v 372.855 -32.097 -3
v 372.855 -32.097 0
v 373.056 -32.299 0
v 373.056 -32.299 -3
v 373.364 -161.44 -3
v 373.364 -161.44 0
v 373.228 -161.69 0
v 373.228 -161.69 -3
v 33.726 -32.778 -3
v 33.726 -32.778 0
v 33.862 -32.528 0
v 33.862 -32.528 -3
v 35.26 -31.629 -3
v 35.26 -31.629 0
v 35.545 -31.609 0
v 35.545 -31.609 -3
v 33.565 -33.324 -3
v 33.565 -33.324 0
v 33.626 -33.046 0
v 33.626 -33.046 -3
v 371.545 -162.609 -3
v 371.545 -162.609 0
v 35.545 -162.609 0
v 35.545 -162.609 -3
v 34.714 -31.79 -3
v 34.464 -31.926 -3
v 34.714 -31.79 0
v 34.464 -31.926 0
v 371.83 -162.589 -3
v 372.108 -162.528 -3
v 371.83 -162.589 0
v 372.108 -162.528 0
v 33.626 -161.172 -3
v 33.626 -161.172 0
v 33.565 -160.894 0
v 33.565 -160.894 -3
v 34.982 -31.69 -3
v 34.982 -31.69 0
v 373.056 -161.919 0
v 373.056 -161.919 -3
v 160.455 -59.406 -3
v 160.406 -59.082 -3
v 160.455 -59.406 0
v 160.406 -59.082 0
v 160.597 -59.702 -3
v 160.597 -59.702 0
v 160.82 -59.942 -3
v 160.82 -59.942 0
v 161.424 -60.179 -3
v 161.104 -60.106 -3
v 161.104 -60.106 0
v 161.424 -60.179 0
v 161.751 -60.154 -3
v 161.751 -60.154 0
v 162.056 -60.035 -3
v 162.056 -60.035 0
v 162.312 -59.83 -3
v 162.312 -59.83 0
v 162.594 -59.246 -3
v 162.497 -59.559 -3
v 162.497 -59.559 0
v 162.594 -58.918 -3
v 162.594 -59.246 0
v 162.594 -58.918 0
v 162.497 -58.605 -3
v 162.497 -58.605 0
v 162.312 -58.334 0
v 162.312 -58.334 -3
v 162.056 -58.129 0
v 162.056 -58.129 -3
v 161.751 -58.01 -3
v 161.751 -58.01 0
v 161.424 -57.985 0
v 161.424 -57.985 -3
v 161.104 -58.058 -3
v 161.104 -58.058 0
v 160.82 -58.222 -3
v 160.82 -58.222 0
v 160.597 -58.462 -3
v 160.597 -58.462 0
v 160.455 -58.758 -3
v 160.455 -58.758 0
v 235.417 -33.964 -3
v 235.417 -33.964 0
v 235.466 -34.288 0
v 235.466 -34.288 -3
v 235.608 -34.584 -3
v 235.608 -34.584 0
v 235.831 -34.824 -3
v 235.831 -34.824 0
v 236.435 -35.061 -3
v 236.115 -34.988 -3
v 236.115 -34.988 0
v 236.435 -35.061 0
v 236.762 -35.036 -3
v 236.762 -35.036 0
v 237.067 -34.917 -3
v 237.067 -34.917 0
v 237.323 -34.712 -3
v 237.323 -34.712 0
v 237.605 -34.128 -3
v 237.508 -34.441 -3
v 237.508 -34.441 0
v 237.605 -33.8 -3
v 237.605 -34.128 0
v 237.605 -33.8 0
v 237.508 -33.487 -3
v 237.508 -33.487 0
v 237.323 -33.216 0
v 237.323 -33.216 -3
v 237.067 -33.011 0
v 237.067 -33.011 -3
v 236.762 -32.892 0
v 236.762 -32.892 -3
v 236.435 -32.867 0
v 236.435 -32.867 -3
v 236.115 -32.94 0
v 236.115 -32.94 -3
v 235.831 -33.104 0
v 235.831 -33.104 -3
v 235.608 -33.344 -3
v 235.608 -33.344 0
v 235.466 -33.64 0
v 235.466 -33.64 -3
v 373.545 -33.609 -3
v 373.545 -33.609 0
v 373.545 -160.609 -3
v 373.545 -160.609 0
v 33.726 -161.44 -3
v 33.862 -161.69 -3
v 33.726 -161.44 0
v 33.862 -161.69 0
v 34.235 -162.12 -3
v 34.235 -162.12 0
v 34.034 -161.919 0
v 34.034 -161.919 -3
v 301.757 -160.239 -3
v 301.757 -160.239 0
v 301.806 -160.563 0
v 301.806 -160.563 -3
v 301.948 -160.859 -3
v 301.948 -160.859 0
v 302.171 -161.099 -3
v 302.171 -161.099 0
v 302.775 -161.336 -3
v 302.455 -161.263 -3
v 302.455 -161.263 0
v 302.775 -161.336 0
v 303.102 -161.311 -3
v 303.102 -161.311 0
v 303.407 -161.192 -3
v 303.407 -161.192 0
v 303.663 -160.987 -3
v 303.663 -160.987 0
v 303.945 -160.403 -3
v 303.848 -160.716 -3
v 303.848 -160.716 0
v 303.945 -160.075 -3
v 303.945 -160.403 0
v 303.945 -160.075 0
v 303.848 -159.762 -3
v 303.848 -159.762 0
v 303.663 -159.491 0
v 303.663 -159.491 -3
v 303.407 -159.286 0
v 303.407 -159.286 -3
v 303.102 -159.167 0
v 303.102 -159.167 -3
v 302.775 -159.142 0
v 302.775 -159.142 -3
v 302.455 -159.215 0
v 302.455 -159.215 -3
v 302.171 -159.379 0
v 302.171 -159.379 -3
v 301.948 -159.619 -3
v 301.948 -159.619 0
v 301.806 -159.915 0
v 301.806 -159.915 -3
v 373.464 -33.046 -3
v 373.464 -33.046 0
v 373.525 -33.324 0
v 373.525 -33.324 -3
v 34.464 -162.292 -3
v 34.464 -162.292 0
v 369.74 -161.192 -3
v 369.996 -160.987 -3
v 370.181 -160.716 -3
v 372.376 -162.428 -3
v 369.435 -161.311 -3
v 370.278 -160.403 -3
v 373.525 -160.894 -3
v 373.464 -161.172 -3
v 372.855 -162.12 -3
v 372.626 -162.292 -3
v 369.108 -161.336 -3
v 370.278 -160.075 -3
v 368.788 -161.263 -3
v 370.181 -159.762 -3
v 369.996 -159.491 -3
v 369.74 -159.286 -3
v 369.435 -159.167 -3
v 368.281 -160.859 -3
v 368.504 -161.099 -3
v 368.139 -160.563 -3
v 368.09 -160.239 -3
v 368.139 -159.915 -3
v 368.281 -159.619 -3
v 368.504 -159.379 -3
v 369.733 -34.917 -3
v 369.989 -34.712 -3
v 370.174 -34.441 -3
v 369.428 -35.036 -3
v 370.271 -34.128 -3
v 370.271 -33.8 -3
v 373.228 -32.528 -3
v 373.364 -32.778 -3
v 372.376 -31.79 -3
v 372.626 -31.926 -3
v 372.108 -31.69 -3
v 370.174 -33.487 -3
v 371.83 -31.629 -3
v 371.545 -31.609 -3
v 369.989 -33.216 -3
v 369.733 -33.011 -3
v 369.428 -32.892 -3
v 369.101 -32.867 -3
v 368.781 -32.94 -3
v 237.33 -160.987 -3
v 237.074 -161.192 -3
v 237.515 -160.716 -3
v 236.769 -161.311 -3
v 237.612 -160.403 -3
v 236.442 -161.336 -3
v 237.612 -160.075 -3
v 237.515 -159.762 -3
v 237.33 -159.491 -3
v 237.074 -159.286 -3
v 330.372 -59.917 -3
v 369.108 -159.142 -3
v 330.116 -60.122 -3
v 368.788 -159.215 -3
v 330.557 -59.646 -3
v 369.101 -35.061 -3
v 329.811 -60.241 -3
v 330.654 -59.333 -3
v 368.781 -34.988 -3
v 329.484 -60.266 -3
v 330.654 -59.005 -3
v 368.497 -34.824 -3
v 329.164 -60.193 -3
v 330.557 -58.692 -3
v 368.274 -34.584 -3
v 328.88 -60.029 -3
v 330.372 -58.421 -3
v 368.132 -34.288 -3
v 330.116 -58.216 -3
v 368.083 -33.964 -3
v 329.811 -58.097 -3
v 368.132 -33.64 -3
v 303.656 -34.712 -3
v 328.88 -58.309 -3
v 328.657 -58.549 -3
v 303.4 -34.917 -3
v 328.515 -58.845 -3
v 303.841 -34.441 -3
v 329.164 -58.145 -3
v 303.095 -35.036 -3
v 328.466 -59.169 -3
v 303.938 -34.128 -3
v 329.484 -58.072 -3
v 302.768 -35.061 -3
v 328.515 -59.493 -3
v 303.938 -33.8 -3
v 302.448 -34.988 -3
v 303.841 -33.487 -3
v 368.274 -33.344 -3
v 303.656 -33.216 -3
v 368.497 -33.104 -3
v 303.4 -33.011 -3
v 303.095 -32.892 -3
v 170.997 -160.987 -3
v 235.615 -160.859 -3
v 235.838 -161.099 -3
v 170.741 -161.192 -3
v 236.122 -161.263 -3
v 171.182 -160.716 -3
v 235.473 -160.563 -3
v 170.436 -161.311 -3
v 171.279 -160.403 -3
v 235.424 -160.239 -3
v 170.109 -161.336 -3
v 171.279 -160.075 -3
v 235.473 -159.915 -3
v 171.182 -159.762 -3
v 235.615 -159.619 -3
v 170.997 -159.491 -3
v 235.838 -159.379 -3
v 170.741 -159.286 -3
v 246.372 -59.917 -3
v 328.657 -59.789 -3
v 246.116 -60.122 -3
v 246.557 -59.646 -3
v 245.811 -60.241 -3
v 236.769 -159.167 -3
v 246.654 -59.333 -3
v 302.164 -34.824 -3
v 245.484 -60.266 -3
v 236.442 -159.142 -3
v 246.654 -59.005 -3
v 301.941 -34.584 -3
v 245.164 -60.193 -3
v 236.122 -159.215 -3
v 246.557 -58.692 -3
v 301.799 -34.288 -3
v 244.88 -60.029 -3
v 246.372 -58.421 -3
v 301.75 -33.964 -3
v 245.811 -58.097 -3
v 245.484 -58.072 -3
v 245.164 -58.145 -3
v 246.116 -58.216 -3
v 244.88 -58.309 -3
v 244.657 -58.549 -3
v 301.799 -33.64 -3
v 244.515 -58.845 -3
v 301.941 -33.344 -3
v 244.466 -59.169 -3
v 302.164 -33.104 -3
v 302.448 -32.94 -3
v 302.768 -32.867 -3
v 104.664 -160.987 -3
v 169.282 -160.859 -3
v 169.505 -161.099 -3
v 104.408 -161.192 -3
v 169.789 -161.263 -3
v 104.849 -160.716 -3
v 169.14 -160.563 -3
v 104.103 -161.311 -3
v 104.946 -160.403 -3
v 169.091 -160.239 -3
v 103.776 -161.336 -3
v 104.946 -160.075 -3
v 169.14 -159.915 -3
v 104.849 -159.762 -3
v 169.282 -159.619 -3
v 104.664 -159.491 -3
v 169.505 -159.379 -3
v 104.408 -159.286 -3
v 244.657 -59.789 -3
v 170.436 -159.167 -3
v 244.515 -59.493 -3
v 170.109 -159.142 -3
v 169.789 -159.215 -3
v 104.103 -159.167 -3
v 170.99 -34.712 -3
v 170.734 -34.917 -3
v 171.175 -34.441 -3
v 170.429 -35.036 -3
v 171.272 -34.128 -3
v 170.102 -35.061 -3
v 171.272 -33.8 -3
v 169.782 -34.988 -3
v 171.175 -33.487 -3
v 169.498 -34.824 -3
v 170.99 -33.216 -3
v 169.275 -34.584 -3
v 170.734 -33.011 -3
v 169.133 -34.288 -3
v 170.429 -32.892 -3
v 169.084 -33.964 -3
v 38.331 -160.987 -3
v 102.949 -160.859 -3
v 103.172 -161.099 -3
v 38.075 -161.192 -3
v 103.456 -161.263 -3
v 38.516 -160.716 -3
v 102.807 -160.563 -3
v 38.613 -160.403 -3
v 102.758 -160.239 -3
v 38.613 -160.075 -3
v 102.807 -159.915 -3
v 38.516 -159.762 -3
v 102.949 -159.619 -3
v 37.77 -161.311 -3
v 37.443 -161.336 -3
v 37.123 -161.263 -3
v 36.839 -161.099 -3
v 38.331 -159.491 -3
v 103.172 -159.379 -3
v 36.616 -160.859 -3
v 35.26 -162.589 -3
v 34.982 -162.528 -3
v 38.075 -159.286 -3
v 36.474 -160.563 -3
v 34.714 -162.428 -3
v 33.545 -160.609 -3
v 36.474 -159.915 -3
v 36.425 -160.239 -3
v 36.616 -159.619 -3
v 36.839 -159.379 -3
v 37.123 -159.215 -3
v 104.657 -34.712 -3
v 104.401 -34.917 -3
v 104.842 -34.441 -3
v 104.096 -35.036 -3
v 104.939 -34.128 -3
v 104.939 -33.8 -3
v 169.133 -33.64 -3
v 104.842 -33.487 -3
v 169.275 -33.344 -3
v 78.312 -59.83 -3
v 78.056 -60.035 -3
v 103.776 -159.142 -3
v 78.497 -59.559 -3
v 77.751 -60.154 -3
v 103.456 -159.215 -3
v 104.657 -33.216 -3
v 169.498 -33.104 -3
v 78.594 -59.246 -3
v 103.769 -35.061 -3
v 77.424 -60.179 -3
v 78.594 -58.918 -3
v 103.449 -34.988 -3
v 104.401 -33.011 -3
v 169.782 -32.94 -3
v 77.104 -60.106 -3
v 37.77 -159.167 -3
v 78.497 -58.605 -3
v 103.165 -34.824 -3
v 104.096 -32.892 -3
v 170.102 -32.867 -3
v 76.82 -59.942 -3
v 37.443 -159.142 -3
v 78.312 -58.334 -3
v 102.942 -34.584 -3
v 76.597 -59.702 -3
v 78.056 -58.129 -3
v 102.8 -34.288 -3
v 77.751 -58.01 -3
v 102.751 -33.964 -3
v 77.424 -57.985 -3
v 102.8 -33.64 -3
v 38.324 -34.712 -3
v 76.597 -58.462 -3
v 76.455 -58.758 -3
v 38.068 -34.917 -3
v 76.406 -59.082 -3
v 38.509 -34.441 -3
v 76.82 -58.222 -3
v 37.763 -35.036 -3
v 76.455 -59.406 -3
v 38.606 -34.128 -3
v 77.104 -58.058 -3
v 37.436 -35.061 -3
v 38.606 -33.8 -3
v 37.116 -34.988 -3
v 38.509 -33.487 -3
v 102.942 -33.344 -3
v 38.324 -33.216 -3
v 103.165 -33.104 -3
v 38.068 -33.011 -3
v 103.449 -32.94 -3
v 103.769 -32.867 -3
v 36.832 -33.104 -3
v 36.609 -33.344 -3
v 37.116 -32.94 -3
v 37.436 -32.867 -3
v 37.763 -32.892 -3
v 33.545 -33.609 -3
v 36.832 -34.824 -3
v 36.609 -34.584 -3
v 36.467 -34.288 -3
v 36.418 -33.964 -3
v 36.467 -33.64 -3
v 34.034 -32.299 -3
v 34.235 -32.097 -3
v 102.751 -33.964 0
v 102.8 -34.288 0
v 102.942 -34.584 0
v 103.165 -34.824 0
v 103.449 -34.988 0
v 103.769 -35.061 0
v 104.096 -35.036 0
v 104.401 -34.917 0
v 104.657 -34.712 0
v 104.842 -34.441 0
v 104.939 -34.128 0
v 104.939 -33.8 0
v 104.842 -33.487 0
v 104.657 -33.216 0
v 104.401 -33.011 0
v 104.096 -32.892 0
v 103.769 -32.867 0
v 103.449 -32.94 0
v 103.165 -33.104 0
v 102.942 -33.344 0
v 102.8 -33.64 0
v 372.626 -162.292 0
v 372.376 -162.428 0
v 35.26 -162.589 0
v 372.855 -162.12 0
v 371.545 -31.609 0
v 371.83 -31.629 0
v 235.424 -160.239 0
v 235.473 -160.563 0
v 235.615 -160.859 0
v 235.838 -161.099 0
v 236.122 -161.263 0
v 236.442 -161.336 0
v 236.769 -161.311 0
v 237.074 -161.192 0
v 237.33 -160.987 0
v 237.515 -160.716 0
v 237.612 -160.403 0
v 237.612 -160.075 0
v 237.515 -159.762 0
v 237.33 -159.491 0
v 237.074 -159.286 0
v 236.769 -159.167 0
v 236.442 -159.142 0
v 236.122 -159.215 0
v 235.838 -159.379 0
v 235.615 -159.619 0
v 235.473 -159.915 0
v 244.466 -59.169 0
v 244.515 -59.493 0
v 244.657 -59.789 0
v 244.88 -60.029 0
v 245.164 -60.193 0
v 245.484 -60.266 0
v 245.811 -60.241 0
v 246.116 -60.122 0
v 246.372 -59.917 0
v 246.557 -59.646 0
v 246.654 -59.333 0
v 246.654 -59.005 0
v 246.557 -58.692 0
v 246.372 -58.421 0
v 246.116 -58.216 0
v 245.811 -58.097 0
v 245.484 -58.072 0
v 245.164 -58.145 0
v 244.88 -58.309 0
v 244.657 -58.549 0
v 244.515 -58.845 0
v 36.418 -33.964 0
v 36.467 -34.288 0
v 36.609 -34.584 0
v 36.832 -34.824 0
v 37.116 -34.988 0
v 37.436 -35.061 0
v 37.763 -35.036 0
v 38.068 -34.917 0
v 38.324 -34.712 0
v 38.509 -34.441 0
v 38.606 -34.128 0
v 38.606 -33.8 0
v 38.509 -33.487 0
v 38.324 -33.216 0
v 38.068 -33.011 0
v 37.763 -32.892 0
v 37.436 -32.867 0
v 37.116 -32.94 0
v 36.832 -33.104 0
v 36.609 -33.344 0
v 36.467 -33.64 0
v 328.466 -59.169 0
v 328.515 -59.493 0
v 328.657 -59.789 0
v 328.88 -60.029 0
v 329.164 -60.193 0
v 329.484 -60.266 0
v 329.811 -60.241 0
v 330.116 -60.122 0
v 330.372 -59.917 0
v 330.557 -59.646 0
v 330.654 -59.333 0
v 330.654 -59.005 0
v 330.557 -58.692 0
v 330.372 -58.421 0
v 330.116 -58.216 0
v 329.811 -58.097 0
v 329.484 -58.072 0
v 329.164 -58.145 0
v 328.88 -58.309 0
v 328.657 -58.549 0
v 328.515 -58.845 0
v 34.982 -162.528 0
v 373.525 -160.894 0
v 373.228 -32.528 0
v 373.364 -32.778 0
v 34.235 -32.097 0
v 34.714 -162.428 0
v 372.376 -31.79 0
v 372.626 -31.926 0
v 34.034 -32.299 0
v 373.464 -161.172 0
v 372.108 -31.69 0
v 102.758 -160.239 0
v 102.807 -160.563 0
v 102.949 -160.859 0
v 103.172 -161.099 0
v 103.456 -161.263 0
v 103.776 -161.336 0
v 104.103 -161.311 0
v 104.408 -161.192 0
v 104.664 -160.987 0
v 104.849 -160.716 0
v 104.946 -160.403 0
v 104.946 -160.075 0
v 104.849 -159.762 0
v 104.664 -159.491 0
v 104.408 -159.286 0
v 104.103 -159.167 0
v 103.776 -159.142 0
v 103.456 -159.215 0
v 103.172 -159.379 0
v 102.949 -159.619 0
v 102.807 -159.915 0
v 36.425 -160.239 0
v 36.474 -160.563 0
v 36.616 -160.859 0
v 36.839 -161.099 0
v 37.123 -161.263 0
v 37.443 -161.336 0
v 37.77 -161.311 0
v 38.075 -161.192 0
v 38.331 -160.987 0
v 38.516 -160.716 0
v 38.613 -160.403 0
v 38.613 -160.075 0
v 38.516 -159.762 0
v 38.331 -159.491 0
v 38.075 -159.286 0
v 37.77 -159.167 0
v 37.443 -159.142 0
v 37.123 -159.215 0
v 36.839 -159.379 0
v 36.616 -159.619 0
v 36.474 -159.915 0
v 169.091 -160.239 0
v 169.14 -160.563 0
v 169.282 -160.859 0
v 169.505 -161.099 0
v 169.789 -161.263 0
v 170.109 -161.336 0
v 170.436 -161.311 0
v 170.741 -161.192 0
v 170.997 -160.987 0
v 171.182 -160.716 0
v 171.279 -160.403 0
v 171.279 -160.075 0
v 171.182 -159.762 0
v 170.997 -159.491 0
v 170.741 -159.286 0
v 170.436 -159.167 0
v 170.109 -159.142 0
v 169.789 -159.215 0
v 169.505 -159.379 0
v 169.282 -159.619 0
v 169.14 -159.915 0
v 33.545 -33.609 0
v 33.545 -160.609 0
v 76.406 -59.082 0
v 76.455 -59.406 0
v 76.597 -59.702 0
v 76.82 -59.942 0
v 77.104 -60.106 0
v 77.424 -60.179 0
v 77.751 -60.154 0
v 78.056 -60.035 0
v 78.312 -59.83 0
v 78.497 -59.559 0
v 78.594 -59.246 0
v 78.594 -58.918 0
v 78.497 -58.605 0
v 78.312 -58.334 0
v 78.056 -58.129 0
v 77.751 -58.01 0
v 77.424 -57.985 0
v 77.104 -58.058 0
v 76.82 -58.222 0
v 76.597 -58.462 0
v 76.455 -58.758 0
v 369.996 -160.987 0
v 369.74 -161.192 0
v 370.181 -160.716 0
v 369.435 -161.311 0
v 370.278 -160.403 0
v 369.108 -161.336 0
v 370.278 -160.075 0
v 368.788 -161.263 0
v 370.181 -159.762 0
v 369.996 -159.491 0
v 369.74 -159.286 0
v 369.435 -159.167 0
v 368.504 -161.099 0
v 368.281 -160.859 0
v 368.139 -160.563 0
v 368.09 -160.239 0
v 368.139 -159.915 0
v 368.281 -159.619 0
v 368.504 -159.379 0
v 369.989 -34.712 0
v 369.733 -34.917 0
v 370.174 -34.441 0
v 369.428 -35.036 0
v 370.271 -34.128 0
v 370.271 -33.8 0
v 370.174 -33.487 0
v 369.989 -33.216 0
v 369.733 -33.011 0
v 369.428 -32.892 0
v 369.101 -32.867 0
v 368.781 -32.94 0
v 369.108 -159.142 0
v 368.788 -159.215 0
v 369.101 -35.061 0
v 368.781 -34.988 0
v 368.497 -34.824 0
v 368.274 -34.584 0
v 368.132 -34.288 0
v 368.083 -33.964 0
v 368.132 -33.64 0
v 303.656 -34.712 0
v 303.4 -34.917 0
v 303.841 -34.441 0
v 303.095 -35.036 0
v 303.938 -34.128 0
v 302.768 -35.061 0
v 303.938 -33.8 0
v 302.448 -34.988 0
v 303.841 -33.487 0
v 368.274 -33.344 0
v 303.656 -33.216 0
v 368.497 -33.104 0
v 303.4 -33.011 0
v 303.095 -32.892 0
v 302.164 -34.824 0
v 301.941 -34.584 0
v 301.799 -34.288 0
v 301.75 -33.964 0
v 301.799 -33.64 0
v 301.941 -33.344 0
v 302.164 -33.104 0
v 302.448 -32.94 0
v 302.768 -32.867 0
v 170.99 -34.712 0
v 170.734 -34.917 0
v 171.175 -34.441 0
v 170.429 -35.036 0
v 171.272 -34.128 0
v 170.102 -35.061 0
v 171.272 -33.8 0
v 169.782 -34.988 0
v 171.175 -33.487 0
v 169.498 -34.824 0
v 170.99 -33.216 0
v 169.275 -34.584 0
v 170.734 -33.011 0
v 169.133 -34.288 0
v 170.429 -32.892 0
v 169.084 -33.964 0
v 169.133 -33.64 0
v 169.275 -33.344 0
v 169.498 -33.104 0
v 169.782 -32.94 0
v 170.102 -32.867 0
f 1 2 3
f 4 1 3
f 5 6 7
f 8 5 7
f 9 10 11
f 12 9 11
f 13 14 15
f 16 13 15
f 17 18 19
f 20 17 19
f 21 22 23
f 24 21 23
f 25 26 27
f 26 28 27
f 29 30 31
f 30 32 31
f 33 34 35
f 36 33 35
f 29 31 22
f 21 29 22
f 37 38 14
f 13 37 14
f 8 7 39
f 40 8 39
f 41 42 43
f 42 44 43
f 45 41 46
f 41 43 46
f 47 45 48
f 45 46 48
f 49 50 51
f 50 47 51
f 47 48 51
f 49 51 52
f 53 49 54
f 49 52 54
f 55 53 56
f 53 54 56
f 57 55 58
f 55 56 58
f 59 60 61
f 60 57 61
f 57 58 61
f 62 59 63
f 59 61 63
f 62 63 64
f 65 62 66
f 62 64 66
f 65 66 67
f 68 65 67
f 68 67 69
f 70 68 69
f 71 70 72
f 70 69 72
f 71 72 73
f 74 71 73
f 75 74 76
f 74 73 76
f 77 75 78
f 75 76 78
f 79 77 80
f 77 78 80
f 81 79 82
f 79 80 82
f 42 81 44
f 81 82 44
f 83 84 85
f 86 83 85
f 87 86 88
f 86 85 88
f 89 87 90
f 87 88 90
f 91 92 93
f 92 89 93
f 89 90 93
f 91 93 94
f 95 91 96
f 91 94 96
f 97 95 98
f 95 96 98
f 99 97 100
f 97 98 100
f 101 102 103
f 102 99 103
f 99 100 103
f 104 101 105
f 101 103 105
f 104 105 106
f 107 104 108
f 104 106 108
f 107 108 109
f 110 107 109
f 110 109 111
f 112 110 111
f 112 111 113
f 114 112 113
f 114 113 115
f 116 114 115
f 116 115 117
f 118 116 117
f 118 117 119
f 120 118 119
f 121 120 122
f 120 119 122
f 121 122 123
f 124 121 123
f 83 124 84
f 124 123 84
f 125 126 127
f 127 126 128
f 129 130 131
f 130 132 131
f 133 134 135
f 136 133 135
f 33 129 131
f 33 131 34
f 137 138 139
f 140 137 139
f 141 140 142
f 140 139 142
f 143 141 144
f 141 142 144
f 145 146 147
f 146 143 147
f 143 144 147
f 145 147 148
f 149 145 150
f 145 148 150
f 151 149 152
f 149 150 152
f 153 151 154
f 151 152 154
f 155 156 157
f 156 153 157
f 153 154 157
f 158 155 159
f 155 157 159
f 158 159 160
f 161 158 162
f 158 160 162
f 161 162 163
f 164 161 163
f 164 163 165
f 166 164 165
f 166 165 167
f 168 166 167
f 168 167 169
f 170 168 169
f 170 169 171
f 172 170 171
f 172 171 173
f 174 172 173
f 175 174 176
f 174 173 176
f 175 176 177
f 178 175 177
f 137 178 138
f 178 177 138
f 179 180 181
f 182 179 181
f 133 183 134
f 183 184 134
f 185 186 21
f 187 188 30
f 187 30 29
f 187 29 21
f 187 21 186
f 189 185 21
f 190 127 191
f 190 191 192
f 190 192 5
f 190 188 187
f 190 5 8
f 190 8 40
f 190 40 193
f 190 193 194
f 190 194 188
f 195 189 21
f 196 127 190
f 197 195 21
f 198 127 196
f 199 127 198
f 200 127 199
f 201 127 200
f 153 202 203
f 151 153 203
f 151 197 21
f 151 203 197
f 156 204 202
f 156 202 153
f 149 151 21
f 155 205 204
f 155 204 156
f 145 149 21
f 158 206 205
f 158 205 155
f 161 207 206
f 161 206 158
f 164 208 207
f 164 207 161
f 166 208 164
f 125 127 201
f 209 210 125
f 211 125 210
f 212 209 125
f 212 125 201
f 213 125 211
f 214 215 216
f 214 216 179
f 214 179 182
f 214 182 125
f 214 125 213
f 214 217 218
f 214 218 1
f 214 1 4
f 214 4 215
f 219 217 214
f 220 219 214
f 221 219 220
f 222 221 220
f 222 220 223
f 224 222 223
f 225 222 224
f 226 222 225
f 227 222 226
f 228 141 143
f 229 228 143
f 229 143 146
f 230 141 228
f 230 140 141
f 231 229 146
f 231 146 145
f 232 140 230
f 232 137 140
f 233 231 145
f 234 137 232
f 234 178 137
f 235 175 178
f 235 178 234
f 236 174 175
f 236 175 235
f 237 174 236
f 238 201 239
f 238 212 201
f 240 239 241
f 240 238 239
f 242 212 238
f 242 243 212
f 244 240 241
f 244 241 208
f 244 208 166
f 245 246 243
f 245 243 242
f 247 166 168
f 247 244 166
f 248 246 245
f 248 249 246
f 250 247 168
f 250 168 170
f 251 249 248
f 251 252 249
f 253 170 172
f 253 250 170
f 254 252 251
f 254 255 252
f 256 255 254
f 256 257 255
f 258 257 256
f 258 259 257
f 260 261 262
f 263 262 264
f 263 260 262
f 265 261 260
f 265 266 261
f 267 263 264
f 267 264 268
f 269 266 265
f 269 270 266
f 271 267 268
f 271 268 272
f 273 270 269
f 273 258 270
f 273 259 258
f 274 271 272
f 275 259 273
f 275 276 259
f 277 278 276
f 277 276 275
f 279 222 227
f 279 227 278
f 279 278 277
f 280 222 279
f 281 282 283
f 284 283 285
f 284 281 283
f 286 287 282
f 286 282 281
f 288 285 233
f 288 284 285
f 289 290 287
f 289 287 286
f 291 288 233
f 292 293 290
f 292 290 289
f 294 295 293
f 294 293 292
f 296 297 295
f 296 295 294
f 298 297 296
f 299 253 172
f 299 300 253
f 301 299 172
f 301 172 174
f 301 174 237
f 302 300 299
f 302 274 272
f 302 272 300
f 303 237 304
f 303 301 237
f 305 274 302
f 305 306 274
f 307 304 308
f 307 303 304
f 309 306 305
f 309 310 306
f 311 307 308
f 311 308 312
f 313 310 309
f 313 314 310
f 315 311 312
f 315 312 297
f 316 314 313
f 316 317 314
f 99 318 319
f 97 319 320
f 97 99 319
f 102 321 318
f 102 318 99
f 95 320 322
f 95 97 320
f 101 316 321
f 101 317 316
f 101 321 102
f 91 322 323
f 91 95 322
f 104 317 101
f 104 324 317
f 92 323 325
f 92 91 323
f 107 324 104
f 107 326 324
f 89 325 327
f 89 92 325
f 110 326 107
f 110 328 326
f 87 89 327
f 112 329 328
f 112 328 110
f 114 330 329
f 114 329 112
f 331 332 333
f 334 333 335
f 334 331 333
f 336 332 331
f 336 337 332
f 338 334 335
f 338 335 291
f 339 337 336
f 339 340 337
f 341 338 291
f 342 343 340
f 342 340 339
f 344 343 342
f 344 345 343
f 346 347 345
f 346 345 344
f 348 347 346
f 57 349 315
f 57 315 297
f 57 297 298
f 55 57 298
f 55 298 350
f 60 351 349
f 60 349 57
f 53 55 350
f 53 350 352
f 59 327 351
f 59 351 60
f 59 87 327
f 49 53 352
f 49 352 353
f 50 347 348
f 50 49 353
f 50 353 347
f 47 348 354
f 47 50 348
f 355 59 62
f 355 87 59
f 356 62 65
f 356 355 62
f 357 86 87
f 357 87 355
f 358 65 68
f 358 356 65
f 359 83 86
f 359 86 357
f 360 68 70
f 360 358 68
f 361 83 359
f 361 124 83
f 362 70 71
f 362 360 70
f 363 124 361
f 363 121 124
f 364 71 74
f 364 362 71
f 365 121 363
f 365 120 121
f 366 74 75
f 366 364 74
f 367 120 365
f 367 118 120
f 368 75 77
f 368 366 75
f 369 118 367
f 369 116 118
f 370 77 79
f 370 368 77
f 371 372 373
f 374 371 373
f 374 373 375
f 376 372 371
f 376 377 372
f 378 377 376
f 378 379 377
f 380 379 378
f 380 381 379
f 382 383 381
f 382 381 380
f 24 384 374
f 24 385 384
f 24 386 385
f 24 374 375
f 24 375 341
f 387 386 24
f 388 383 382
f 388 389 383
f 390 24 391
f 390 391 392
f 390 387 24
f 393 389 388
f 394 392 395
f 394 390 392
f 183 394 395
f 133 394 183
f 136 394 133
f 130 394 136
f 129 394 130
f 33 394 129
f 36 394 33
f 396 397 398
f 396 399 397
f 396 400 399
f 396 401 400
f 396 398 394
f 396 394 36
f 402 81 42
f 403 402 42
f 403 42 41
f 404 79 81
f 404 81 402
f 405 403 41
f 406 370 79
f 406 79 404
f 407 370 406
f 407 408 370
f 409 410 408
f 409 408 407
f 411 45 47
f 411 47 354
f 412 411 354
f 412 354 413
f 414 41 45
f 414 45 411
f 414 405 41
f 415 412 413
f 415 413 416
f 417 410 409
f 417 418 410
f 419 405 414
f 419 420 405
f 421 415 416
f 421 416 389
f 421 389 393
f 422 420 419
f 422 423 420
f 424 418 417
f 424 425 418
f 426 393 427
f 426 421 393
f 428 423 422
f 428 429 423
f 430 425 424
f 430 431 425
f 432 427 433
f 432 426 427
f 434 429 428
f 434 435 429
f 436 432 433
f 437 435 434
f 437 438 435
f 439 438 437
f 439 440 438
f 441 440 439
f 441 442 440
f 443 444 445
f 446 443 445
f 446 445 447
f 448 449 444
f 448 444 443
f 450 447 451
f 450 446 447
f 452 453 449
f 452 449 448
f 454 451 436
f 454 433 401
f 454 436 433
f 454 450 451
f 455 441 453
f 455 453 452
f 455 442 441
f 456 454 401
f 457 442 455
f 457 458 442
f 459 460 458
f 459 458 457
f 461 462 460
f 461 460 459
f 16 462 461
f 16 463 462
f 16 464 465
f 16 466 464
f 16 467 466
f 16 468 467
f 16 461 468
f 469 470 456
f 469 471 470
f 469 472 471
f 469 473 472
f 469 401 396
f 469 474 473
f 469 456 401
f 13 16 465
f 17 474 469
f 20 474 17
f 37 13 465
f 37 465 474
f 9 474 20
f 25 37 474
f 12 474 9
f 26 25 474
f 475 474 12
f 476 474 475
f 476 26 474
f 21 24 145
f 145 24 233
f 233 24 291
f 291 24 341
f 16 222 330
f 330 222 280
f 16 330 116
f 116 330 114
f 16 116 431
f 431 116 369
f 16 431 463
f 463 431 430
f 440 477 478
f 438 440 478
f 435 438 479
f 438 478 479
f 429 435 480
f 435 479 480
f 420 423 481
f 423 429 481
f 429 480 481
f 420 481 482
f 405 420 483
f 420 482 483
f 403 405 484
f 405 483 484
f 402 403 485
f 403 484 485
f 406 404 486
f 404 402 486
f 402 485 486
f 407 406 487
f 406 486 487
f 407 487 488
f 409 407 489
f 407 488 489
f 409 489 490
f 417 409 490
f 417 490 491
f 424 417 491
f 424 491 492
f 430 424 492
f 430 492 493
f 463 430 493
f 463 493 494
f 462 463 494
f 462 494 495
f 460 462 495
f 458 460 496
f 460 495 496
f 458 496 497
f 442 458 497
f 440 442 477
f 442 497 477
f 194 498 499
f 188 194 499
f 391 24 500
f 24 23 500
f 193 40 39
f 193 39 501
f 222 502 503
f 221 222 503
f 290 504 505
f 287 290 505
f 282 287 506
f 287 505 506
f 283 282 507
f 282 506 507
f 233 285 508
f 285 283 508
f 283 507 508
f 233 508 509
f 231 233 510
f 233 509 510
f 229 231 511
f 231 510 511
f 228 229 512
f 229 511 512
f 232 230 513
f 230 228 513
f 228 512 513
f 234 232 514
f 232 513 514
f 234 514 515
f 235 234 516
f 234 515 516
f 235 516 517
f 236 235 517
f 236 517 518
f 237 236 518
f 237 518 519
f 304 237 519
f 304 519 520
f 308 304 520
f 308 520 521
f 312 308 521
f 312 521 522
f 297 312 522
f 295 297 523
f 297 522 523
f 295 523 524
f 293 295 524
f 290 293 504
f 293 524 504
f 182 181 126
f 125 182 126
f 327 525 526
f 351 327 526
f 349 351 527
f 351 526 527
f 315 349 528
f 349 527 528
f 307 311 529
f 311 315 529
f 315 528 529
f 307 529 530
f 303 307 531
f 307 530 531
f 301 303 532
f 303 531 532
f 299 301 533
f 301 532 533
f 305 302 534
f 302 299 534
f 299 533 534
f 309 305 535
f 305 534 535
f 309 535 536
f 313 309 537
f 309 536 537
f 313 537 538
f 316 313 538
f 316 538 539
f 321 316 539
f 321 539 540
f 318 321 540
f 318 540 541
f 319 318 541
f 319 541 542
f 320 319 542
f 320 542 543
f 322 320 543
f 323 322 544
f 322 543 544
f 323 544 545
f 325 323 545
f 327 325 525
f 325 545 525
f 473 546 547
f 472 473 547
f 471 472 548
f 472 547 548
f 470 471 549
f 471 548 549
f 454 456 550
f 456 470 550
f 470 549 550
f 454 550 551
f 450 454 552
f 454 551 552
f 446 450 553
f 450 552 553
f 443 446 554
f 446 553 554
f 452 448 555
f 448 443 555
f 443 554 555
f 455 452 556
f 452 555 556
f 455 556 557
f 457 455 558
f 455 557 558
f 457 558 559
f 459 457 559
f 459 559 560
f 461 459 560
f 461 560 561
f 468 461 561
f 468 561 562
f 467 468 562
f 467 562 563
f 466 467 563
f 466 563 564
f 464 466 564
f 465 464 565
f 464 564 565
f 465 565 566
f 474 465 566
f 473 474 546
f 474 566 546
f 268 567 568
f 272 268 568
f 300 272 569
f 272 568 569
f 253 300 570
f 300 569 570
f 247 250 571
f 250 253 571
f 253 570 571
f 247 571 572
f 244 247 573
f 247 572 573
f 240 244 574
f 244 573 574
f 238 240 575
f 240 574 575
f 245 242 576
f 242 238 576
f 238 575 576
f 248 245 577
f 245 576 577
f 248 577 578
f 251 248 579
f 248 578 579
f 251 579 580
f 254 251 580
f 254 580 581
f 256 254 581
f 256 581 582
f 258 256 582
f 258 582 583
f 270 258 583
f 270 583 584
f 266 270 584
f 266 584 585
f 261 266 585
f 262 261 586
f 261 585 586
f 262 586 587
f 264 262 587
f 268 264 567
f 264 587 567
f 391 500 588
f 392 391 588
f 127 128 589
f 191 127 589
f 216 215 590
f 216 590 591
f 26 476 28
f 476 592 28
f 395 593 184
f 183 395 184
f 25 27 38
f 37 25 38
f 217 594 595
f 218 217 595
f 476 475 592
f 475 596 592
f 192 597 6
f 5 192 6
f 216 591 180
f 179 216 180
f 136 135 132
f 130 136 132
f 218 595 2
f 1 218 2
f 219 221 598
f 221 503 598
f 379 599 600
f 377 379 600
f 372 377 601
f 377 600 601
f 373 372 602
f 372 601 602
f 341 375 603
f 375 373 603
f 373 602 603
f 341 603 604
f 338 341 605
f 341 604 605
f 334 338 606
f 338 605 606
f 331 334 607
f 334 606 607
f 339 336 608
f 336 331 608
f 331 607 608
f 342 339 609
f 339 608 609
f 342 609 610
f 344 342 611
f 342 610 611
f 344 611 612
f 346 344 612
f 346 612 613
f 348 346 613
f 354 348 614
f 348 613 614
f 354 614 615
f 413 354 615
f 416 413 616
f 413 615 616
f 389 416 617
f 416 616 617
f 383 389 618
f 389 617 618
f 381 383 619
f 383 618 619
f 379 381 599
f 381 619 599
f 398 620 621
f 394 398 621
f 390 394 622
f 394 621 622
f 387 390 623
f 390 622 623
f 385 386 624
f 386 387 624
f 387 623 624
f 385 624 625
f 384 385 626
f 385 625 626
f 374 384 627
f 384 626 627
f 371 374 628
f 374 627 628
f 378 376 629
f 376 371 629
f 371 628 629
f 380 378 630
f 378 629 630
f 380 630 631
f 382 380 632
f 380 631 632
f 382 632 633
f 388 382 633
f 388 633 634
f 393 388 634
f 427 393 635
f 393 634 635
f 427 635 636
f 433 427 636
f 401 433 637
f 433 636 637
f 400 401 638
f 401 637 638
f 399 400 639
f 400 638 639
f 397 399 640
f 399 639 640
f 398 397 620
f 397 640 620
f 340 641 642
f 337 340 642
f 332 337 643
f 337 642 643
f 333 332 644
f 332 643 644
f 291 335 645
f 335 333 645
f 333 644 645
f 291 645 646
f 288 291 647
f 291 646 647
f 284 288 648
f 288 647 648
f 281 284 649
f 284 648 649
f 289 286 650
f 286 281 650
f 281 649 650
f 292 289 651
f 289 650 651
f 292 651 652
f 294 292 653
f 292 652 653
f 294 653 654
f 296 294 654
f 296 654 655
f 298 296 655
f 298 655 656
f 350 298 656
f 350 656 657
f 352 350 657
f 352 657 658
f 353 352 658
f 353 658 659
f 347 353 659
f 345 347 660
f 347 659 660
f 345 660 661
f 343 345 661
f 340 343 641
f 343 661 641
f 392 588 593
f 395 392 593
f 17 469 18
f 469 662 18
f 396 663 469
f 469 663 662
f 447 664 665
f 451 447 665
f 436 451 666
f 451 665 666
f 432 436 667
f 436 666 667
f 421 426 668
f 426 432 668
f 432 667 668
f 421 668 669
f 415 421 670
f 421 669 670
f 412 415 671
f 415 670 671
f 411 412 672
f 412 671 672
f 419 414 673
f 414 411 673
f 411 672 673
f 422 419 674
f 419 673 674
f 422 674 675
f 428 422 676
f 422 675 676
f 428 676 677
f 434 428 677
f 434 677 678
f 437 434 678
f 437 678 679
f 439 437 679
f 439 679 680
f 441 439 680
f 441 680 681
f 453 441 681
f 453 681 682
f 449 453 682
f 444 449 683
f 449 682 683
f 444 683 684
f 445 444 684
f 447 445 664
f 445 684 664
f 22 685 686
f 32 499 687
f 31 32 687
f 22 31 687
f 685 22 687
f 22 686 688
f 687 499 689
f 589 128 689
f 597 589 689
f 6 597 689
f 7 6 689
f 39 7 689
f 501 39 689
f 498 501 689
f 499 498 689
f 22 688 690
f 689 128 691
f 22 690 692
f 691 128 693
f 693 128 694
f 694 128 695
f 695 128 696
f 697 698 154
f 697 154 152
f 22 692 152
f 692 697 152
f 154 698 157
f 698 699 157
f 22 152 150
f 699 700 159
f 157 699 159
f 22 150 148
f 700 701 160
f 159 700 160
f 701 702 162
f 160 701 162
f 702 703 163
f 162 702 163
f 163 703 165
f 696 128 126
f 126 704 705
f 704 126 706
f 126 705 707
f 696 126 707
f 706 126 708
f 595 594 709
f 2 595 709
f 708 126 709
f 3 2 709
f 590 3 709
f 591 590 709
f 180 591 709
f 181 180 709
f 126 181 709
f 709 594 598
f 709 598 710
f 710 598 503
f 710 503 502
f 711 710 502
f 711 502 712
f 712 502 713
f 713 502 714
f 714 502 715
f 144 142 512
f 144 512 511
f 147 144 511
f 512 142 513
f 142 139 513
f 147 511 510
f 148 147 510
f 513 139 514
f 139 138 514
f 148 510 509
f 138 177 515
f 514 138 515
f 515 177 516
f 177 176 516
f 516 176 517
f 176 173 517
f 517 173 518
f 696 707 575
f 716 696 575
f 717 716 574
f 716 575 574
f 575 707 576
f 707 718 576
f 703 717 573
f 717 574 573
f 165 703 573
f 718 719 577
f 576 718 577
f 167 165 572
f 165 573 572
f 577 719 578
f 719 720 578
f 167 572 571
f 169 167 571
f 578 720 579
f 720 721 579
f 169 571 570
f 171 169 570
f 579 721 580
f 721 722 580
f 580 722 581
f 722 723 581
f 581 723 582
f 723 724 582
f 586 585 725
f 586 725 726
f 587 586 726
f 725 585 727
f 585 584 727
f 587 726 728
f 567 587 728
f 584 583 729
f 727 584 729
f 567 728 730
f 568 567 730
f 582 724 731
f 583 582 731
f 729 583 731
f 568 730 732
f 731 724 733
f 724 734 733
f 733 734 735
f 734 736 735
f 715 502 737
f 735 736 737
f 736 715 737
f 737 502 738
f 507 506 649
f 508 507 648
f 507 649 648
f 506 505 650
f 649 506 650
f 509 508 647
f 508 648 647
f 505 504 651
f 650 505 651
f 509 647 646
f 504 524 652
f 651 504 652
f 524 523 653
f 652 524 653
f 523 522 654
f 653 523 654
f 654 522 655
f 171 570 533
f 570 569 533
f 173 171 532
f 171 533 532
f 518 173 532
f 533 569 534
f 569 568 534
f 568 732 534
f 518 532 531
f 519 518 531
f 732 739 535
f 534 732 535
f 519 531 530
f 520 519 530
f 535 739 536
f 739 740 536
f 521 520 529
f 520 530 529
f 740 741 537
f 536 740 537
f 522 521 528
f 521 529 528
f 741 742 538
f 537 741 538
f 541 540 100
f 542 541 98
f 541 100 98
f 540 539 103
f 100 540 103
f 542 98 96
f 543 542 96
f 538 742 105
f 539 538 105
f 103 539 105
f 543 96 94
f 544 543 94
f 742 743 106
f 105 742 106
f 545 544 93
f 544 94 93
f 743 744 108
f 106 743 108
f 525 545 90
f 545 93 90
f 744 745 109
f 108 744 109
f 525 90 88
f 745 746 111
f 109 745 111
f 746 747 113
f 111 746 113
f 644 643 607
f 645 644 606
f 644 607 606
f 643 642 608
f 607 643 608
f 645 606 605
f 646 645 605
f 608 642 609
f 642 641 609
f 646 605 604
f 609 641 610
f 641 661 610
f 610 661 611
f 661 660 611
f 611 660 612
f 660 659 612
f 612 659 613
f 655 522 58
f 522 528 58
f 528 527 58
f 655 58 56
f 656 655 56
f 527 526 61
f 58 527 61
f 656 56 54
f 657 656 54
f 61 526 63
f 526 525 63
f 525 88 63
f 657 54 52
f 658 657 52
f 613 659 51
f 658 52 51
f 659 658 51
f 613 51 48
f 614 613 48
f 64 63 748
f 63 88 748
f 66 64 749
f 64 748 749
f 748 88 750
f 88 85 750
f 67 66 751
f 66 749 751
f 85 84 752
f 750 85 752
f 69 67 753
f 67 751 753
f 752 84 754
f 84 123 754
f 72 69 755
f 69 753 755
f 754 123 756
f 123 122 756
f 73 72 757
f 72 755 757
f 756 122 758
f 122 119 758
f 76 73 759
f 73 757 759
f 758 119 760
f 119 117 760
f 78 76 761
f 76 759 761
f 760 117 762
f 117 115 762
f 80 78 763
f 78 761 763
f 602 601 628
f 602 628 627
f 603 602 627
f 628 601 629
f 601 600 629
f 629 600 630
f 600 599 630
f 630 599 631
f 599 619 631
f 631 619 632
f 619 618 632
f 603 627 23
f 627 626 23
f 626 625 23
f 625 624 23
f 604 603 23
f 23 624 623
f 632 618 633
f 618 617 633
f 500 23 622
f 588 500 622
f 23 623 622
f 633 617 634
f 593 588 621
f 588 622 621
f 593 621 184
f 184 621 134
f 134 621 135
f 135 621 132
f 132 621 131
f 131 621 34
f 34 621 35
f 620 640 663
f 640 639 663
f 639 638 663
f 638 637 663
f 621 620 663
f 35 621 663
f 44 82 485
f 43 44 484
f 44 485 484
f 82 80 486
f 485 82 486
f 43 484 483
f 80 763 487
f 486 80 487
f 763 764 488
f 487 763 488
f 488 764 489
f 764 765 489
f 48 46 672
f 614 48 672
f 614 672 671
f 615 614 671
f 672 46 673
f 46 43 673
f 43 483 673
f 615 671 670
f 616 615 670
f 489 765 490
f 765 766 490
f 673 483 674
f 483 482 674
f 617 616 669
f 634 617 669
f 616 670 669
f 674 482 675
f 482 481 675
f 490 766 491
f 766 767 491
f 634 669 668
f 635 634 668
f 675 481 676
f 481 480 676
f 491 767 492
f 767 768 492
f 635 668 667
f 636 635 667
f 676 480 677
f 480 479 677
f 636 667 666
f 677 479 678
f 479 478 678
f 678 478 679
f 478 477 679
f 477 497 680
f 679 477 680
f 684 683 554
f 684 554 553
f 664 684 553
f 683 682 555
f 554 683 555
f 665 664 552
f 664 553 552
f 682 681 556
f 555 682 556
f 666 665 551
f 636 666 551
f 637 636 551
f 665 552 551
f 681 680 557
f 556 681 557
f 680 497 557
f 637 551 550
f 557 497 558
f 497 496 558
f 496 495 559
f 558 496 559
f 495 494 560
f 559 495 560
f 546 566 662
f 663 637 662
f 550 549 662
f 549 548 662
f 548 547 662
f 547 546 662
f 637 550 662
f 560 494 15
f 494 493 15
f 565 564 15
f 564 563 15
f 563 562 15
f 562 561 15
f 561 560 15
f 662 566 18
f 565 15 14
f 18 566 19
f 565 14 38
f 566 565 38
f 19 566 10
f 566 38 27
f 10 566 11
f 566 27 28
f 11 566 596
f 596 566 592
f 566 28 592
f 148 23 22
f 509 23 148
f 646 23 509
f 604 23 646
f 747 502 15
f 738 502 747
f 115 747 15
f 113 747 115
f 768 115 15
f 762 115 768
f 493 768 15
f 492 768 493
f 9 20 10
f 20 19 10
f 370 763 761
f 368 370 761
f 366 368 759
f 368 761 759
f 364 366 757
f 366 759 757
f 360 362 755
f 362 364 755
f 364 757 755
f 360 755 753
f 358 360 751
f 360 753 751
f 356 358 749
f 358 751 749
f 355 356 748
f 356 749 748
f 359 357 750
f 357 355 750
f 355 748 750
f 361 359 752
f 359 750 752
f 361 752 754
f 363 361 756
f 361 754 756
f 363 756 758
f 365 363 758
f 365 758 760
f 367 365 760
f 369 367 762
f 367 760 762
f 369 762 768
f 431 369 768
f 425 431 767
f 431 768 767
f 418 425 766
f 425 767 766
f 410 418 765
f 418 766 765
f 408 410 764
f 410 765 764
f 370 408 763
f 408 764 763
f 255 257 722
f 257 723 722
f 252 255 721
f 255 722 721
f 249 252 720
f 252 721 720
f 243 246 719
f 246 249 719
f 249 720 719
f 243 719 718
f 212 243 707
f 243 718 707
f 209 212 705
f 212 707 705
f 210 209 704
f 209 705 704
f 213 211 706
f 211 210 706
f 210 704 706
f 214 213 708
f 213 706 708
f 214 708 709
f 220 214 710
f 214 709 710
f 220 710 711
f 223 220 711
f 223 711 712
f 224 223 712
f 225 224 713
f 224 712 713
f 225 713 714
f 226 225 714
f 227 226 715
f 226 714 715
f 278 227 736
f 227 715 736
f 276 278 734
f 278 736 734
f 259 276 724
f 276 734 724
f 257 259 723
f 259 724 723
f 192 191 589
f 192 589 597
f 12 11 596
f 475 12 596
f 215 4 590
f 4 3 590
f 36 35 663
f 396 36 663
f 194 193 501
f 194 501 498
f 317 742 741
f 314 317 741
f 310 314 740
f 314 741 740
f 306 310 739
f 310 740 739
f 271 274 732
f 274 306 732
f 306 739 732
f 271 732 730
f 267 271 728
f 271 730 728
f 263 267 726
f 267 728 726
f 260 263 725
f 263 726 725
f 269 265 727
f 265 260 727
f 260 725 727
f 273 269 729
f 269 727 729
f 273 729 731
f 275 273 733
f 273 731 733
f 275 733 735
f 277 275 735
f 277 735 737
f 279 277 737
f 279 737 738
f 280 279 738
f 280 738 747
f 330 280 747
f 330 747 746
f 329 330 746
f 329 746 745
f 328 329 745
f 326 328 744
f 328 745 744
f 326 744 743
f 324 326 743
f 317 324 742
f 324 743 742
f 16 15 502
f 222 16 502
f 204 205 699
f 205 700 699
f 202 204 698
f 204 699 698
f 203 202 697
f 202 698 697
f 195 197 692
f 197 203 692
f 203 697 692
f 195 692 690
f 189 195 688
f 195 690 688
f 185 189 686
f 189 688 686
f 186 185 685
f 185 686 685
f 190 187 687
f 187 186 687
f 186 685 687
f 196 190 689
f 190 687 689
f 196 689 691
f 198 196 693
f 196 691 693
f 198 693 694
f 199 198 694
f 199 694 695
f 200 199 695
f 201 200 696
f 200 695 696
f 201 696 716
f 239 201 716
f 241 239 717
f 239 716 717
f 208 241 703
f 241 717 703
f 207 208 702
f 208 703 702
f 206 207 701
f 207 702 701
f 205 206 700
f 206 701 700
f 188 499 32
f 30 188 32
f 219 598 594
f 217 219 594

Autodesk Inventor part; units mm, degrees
ref_plane "YZ Plane" through (0, 0, 0) normal (1, 0, 0) x (0, 1, 0)
ref_plane "XZ Plane" through (0, 0, 0) normal (0, 1, 0) x (-1, 0, 0)
ref_plane "XY Plane" through (0, 0, 0) normal (0, 0, 1) x (1, 0, 0)
ref_plane "Work Plane2" through (35.545, -31.609, 1.6) normal (0, 0, 1) x (1, 0, 0)
sketch "Sketch2" plane through (35.545, -31.609, 1.6) normal (0, 0, 1) x (1, 0, 0)
  line L0 (-4.7778, 3.1171) -> (341.5466, 3.1925) construction
  line L1 (341.5466, 3.1925) -> (341.5765, -133.848) construction
  line L2 (341.5765, -133.848) -> (-4.7479, -133.9235) construction
  line L3 (-4.7479, -133.9235) -> (-4.7778, 3.1171) construction
  point P0 (-35.545, 31.609)
ref_plane "Work Plane1" through (371.545, -162.609, 0) normal (0, 0, -1) x (-1, 0, 0)
sketch "Sketch9" plane through (371.545, -162.609, 0) normal (0, 0, -1) x (-1, 0, 0)
  line L0 (336, 131) -> (0, 131) projected
  line L1 (-2, 129) -> (-2, 2) projected
  line L2 (-1.9796, 129.2846) -> (-2, 129) projected
  line L3 (-1.919, 129.5635) -> (-1.9796, 129.2846) projected
  line L4 (-1.8193, 129.8308) -> (-1.919, 129.5635) projected
  line L5 (-1.6825, 130.0813) -> (-1.8193, 129.8308) projected
  line L6 (-1.5115, 130.3097) -> (-1.6825, 130.0813) projected
  line L7 (-1.3097, 130.5115) -> (-1.5115, 130.3097) projected
  line L8 (-1.0813, 130.6825) -> (-1.3097, 130.5115) projected
  line L9 (-0.8308, 130.8193) -> (-1.0813, 130.6825) projected
  line L10 (-0.5635, 130.919) -> (-0.8308, 130.8193) projected
  line L11 (-0.2846, 130.9796) -> (-0.5635, 130.919) projected
  line L12 (0, 131) -> (-0.2846, 130.9796) projected
  circle A0 centre (2.362, 128.645) radius 1.1 projected
  circle A1 centre (68.695, 128.645) radius 1.1 projected
  circle A2 centre (135.028, 128.645) radius 1.1 projected
  circle A3 centre (201.361, 128.645) radius 1.1 projected
  circle A4 centre (267.694, 128.645) radius 1.1 projected
  circle A5 centre (334.027, 128.645) radius 1.1 projected
  line L13 (338, 2) -> (338, 129) projected
  line L14 (338, 129) -> (337.9796, 129.2846) projected
  line L15 (337.9796, 129.2846) -> (337.919, 129.5635) projected
  line L16 (337.919, 129.5635) -> (337.8193, 129.8308) projected
  line L17 (337.8193, 129.8308) -> (337.6825, 130.0813) projected
  line L18 (337.6825, 130.0813) -> (337.5115, 130.3097) projected
  line L19 (337.5115, 130.3097) -> (337.3097, 130.5115) projected
  line L20 (337.3097, 130.5115) -> (337.0813, 130.6825) projected
  line L21 (337.0813, 130.6825) -> (336.8308, 130.8193) projected
  line L22 (336.8308, 130.8193) -> (336.5635, 130.919) projected
  line L23 (336.5635, 130.919) -> (336.2846, 130.9796) projected
  line L24 (336.2846, 130.9796) -> (336, 131) projected
  line L25 (0, 0) -> (336, 0) projected
  line L26 (336, 0) -> (336.2846, 0.0204) projected
  line L27 (336.2846, 0.0204) -> (336.5635, 0.081) projected
  line L28 (336.5635, 0.081) -> (336.8308, 0.1807) projected
  line L29 (336.8308, 0.1807) -> (337.0813, 0.3175) projected
  line L30 (337.0813, 0.3175) -> (337.3097, 0.4885) projected
  line L31 (337.3097, 0.4885) -> (337.5115, 0.6903) projected
  line L32 (337.5115, 0.6903) -> (337.6825, 0.9187) projected
  line L33 (337.6825, 0.9187) -> (337.8193, 1.1692) projected
  line L34 (337.8193, 1.1692) -> (337.919, 1.4365) projected
  line L35 (337.919, 1.4365) -> (337.9796, 1.7154) projected
  line L36 (337.9796, 1.7154) -> (338, 2) projected
  circle A6 centre (334.02, 2.37) radius 1.1 projected
  circle A7 centre (267.687, 2.37) radius 1.1 projected
  circle A8 centre (201.354, 2.37) radius 1.1 projected
  circle A9 centre (135.021, 2.37) radius 1.1 projected
  circle A10 centre (68.688, 2.37) radius 1.1 projected
  circle A11 centre (2.355, 2.37) radius 1.1 projected
  line L37 (-0.2846, 0.0204) -> (0, 0) projected
  line L38 (-0.5635, 0.081) -> (-0.2846, 0.0204) projected
  line L39 (-0.8308, 0.1807) -> (-0.5635, 0.081) projected
  line L40 (-1.0813, 0.3175) -> (-0.8308, 0.1807) projected
  line L41 (-1.3097, 0.4885) -> (-1.0813, 0.3175) projected
  line L42 (-1.5115, 0.6903) -> (-1.3097, 0.4885) projected
  line L43 (-1.6825, 0.9187) -> (-1.5115, 0.6903) projected
  line L44 (-1.8193, 1.1692) -> (-1.6825, 0.9187) projected
  line L45 (-1.919, 1.4365) -> (-1.8193, 1.1692) projected
  line L46 (-1.9796, 1.7154) -> (-1.919, 1.4365) projected
  line L47 (-2, 2) -> (-1.9796, 1.7154) projected
  circle A12 centre (41.979, 103.44) radius 1.1 projected
  circle A13 centre (125.979, 103.44) radius 1.1 projected
  circle A14 centre (210.039, 103.527) radius 1.1 projected
  circle A15 centre (294.039, 103.527) radius 1.1 projected
  point P0 (371.545, 162.609)
extrude "Extrusion3" add sketch "Sketch9" along normal blind 3
properties part number "rear_plate"
